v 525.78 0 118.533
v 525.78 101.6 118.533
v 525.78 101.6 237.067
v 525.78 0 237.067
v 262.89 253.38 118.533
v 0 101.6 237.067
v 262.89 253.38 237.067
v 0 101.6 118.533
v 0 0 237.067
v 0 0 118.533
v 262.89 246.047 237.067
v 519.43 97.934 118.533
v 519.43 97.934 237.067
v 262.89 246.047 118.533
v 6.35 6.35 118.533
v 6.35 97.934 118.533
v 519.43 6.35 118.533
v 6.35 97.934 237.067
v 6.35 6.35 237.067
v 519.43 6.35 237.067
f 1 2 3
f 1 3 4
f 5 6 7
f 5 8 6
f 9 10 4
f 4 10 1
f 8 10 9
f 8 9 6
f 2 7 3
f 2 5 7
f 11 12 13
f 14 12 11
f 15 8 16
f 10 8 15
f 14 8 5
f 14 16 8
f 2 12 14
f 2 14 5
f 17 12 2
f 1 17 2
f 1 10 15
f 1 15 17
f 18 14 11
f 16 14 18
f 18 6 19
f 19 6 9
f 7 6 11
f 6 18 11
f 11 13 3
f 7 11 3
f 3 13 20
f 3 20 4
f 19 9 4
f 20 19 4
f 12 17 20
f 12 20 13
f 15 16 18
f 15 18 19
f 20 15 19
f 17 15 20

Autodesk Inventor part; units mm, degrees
ref_plane "YZ Plane" through (0, 0, 0) normal (1, 0, 0) x (0, 1, 0)
ref_plane "XZ Plane" through (0, 0, 0) normal (0, 1, 0) x (-1, 0, 0)
ref_plane "XY Plane" through (0, 0, 0) normal (0, 0, 1) x (1, 0, 0)
sketch "Sketch1" plane through (0, 0, 0) normal (0, 0, 1) x (1, 0, 0)
  line L0 (0, 0) -> (525.78, 0)
  line L1 (0, 0) -> (0, 101.6)
  line L2 (0, 101.6) -> (262.89, 253.3796)
  line L3 (262.89, 253.3796) -> (525.78, 101.6)
  line L4 (525.78, 101.6) -> (525.78, 0)
  line L5 (262.89, 246.0473) -> (6.35, 97.9338)
  line L6 (6.35, 97.9338) -> (6.35, 6.35)
  line L7 (6.35, 6.35) -> (519.43, 6.35)
  line L8 (519.43, 6.35) -> (519.43, 97.9338)
  line L9 (519.43, 97.9338) -> (262.89, 246.0473)
  point P0 (262.89, 0)
  dimension "d0" = 525.78
  dimension "d1" = 101.6
  dimension "d2" = 120
  dimension "d3" = 6.35
extrude "Extrusion1" add sketch "Sketch1" along normal blind 355.6
sketch "Sketch2" plane through (0, 0, 355.6) normal (0, 0, 1) x (1, 0, 0)
  line L0 (262.89, 246.0473) -> (519.43, 97.9338) projected
  line L1 (519.43, 97.9338) -> (519.43, 6.35) projected
  line L2 (519.43, 6.35) -> (6.35, 6.35) projected
  line L3 (6.35, 6.35) -> (6.35, 97.9338) projected
  line L4 (6.35, 97.9338) -> (262.89, 246.0473) projected
  line L5 (0, 0) -> (525.78, 0) projected
  line L6 (525.78, 0) -> (525.78, 101.6) projected
  line L7 (525.78, 101.6) -> (262.89, 253.3796) projected
  line L8 (262.89, 253.3796) -> (0, 101.6) projected
  line L9 (0, 101.6) -> (0, 0) projected
  circle A0 centre (262.89, 121.3796) radius 60
  dimension "d6" = 120
  dimension "d7" = 132
extrude "Extrusion2" add sketch "Sketch2" along normal blind 6.35 contours L0 L1 L2 L3 L4 | L9 L8 L7 L6 L5
sketch "Sketch3" plane through (0, 0, 0) normal (0, -1, 0) x (1, 0, 0)
  line L0 (0, 0) -> (525.78, 0) construction
  line L1 (525.78, 0) -> (525.78, 88.9)
  line L2 (525.78, 88.9) -> (0, 88.9) construction
  line L3 (0, 88.9) -> (0, 0) construction
  line L4 (86.36, 21.95) -> (86.36, 66.95) construction
  circle A0 centre (86.36, 44.45) radius 2.3812
  circle A1 centre (86.36, 21.95) radius 2.3812
  circle A2 centre (86.36, 66.95) radius 2.3812
  line L5 (146.36, 49.45) -> (146.36, 29.45) construction
  line L6 (156.36, 66.95) -> (156.36, 21.95) construction
  line L7 (146.36, 29.45) -> (166.36, 29.45) construction
  line L8 (166.36, 49.45) -> (146.36, 49.45) construction
  line L9 (86.36, 66.95) -> (226.36, 66.95) construction
  line L10 (226.36, 21.95) -> (86.36, 21.95) construction
  line L11 (86.36, 44.45) -> (226.36, 44.45) construction
  line L12 (166.36, 29.45) -> (166.36, 49.45) construction
  line L13 (226.36, 66.95) -> (226.36, 21.95) construction
  circle A3 centre (226.36, 66.95) radius 2.3813
  circle A4 centre (226.36, 44.45) radius 2.3813
  circle A5 centre (226.36, 21.95) radius 2.3813
  circle A6 centre (156.36, 39.45) radius 10
  line L14 (0, 0) -> (0, 361.95) projected
  line L15 (525.78, 0) -> (525.78, 361.95) projected
  line L16 (0, 0) -> (525.78, 0) projected
  point P0 (0, 44.45)
  point P1 (146.36, 39.45)
  point P2 (166.36, 39.45)
  point P3 (262.89, 0)
  dimension "d10" = 45
  dimension "d11" = 140
  dimension "d12" = 4.7625
  dimension "d13" = 4.7625
  dimension "d14" = 4.7625
  dimension "d15" = 4.7625
  dimension "d16" = 4.7625
  dimension "d17" = 4.7625
  dimension "d18" = 60
  dimension "d19" = 7.5
  dimension "d20" = 20
  dimension "d21" = 20
  dimension "d22" = 86.36
  dimension "d23" = 88.9
extrude "Extrusion3" cut sketch "Sketch3" against normal blind 6.35
sketch "Sketch4" plane through (0, 0, 0) normal (0, -1, 0) x (1, 0, 0)
  line L0 (71.36, 0) -> (241.36, 0)
  line L1 (241.36, 0) -> (241.36, 85)
  line L2 (241.36, 85) -> (71.36, 85)
  line L3 (71.36, 85) -> (71.36, 0)
  line L4 (0, 0) -> (525.78, 0) construction
  circle A0 centre (156.36, 39.45) radius 10 construction
  point P0 (156.36, 85)
  dimension "d26" = 170
  dimension "d27" = 85
extrude "Extrusion4" cut sketch "Sketch4" against normal blind 6.35
sketch "Sketch5" plane through (0, 0, 361.95) normal (0, -1, 0) x (1, 0, 0)
  line L0 (525.78, -361.95) -> (525.78, 0) projected
  line L1 (525.78, -361.95) -> (0, -361.95)
  line L2 (0, -361.95) -> (0, -243.4167)
  line L3 (0, -243.4167) -> (525.78, -243.4167)
  line L4 (525.78, -243.4167) -> (525.78, -361.95)
  line L5 (525.78, -243.4167) -> (0, -243.4167)
  line L6 (0, -243.4167) -> (0, -124.8833)
  line L7 (0, -124.8833) -> (525.78, -124.8833)
  line L8 (525.78, -124.8833) -> (525.78, -243.4167)
  line L9 (262.89, 0) -> (0, 0) projected
  line L10 (525.78, -124.8833) -> (0, -124.8833)
  line L11 (0, -124.8833) -> (0, 0)
  line L12 (0, 0) -> (525.78, 0)
  line L13 (525.78, 0) -> (525.78, -124.8833)
  line L14 (0, -361.95) -> (0, 0) projected
  point P0 (0, -184.15)
  dimension "d30" = 118.5333
  dimension "d31" = 118.5333
extrude "Extrusion5" cut sketch "Sketch5" against normal through all contours L1 L2 L3 L0 | L7 L11 L9 L12 L0
properties part number "CA01" material "ABS Plastic"
